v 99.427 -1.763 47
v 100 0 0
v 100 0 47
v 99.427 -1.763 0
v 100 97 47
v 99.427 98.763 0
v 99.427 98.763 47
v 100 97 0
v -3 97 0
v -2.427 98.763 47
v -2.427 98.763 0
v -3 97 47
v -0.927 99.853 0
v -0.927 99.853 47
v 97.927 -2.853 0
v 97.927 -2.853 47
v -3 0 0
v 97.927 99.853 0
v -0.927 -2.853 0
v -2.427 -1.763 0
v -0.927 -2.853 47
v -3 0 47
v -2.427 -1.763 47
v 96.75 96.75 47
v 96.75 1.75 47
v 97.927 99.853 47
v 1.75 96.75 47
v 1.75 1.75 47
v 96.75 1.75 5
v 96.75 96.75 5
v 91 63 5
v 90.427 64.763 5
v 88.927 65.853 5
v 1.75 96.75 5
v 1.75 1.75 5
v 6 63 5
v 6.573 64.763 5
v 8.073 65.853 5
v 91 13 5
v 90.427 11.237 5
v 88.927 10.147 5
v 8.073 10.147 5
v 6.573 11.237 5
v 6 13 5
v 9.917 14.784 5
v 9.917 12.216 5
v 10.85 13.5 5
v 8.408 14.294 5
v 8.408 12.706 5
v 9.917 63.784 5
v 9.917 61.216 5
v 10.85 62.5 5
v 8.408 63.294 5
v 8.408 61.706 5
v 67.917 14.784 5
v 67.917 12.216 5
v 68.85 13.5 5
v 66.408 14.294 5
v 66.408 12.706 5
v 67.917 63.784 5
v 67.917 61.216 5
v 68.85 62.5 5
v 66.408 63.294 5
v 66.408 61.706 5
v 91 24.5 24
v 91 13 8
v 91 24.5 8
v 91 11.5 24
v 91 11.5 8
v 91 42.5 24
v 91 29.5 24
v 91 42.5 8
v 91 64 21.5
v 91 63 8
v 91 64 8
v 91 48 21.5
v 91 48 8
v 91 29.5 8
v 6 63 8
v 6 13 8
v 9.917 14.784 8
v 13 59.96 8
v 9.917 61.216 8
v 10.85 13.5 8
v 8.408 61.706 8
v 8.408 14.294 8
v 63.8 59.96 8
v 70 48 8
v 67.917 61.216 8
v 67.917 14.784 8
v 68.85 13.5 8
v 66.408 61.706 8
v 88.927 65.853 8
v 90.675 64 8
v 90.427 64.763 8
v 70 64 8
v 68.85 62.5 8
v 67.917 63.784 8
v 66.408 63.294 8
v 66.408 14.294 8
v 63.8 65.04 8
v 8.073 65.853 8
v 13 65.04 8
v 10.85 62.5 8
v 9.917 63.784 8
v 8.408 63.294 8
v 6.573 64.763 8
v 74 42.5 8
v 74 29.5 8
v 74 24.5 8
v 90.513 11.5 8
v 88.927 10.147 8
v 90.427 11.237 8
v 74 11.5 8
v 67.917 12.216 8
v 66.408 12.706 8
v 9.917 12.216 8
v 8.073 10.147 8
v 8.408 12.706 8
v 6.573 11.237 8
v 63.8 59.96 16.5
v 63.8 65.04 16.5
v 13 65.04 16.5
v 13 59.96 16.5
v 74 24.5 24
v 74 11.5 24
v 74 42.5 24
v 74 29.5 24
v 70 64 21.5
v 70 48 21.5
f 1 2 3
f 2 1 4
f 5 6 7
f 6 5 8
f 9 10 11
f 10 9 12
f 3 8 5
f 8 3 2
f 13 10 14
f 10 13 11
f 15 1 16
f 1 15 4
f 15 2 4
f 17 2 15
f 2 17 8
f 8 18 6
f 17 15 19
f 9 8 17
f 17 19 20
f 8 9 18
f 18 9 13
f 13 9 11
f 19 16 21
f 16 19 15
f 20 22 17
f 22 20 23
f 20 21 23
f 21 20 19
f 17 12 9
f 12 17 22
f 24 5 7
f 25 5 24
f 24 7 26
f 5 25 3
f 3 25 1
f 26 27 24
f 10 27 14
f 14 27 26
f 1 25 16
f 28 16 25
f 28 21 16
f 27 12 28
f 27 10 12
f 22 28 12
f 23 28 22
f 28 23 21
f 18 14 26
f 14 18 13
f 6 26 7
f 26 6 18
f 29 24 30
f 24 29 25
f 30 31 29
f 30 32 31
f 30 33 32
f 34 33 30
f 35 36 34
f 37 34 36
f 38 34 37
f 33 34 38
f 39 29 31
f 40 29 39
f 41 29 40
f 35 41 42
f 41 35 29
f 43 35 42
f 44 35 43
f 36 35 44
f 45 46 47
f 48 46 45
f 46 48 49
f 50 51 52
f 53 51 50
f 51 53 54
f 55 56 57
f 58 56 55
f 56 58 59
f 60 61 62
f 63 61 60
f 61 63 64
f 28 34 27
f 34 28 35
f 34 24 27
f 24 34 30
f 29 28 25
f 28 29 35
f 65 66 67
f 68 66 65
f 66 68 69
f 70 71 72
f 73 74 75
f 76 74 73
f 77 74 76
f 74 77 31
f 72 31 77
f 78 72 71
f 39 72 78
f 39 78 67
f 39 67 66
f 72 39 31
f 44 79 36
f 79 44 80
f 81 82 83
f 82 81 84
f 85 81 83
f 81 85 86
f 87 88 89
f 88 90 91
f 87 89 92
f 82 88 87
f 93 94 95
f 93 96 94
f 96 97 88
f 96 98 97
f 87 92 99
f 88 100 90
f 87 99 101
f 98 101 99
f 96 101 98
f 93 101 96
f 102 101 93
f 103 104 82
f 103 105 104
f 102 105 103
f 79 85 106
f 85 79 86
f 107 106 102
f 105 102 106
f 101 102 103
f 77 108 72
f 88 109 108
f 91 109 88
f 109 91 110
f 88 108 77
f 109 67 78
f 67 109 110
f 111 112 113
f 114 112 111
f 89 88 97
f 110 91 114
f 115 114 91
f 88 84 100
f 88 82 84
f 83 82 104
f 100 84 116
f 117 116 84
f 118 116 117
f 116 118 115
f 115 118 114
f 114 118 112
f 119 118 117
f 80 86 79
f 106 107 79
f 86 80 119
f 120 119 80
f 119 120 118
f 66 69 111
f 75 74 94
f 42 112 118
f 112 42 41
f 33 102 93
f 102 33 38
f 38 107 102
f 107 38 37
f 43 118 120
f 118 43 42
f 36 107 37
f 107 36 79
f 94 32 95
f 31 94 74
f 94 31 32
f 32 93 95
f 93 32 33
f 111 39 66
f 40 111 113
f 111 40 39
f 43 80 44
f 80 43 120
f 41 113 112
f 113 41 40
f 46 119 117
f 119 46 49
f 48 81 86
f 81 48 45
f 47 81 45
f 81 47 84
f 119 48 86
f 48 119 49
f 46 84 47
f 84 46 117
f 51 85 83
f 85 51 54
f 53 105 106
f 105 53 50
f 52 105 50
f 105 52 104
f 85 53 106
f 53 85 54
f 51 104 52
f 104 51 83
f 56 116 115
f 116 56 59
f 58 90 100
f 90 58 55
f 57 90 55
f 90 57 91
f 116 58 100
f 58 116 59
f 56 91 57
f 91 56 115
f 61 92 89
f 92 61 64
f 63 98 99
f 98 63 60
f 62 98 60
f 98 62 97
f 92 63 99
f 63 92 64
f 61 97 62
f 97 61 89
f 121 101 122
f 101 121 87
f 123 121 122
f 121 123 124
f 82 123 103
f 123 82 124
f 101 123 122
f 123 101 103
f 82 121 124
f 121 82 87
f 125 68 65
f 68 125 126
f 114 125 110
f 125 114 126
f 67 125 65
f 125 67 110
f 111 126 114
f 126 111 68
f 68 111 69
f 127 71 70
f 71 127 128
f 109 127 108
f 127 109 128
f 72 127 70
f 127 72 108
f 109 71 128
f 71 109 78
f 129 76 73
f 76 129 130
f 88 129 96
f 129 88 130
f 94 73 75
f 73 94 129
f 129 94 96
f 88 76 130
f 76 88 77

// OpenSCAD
module rpi_4(){
   color("green")render()difference(){
           translate([3,3,0])minkowski(){
//PCB outline

        cube([85-6,56-6,2]); 
        cylinder(r=3, h=1); 
       }
       
//holes       
       translate([3.5,3.5,0])cylinder(h=3,r=2.7/2);
       translate([3.5,56-3.5,0])cylinder(h=3,r=2.7/2); 
       
       translate([3.5+29+29,3.5,0])cylinder(h=3,r=2.7/2);
       translate([3.5+29+29,56-3.5,0])cylinder(h=3,r=2.7/2);
          
   }
   
//GPIO
   color("silver")translate([7,3.5+49-2.54,3])cube([2.54*20,2.54*2,8.5]);
   
//PORTS
   
    //USB
    color("silver")translate([85-17,1.5,3])cube([17,13,16]);
   
    color("silver")translate([85-17,1.5+13+5,3])cube([17,13,16]);
    //ETHERNET
    color("silver")translate([85-21,56-16-2,3])cube([21,16,13.5]);
}



module ftype(){
    translate([3,3,0])minkowski(){
//PCB outline
        render()difference(){
            cube([115-6,90-6,54]); 
            translate([0.125,.125,1.5])cube([115-6.25,90-6.25,54]); 
            }
        
        cylinder(r=2, h=1); 
       }
       
       translate([6,6,0])cylinder(h=55, r=3);
       translate([109,6,0])cylinder(h=55, r=3);
       
       translate([6,83,0])cylinder(h=55, r=3);
       translate([109,83,0])cylinder(h=55, r=3);
      
    
}

module squarejunction(){
    
    render()difference(){
        union()minkowski(){
    //PCB outline
            
            cube([100-3,100-3,44+2]); 
            cylinder(r=3, h=1); 
        }
        
        translate([1.75,1.75,5])cube([100-5,100-5,44+2]);
    }
    
}

module squarejunction_red(){
    
    render()difference(){
        union()minkowski(){
    //PCB outline
            
            cube([100-3,100-3,44+2]); 
            cylinder(r=3, h=1); 
        }
        
        translate([1.75,1.75,5])cube([100-5,100-5,44+2]);
    }
    
}

//translate([6,10,1.5])rpi_4();
//color("red")ftype();

color("red")squarejunction();
translate([6,10,5])rpi_4();
